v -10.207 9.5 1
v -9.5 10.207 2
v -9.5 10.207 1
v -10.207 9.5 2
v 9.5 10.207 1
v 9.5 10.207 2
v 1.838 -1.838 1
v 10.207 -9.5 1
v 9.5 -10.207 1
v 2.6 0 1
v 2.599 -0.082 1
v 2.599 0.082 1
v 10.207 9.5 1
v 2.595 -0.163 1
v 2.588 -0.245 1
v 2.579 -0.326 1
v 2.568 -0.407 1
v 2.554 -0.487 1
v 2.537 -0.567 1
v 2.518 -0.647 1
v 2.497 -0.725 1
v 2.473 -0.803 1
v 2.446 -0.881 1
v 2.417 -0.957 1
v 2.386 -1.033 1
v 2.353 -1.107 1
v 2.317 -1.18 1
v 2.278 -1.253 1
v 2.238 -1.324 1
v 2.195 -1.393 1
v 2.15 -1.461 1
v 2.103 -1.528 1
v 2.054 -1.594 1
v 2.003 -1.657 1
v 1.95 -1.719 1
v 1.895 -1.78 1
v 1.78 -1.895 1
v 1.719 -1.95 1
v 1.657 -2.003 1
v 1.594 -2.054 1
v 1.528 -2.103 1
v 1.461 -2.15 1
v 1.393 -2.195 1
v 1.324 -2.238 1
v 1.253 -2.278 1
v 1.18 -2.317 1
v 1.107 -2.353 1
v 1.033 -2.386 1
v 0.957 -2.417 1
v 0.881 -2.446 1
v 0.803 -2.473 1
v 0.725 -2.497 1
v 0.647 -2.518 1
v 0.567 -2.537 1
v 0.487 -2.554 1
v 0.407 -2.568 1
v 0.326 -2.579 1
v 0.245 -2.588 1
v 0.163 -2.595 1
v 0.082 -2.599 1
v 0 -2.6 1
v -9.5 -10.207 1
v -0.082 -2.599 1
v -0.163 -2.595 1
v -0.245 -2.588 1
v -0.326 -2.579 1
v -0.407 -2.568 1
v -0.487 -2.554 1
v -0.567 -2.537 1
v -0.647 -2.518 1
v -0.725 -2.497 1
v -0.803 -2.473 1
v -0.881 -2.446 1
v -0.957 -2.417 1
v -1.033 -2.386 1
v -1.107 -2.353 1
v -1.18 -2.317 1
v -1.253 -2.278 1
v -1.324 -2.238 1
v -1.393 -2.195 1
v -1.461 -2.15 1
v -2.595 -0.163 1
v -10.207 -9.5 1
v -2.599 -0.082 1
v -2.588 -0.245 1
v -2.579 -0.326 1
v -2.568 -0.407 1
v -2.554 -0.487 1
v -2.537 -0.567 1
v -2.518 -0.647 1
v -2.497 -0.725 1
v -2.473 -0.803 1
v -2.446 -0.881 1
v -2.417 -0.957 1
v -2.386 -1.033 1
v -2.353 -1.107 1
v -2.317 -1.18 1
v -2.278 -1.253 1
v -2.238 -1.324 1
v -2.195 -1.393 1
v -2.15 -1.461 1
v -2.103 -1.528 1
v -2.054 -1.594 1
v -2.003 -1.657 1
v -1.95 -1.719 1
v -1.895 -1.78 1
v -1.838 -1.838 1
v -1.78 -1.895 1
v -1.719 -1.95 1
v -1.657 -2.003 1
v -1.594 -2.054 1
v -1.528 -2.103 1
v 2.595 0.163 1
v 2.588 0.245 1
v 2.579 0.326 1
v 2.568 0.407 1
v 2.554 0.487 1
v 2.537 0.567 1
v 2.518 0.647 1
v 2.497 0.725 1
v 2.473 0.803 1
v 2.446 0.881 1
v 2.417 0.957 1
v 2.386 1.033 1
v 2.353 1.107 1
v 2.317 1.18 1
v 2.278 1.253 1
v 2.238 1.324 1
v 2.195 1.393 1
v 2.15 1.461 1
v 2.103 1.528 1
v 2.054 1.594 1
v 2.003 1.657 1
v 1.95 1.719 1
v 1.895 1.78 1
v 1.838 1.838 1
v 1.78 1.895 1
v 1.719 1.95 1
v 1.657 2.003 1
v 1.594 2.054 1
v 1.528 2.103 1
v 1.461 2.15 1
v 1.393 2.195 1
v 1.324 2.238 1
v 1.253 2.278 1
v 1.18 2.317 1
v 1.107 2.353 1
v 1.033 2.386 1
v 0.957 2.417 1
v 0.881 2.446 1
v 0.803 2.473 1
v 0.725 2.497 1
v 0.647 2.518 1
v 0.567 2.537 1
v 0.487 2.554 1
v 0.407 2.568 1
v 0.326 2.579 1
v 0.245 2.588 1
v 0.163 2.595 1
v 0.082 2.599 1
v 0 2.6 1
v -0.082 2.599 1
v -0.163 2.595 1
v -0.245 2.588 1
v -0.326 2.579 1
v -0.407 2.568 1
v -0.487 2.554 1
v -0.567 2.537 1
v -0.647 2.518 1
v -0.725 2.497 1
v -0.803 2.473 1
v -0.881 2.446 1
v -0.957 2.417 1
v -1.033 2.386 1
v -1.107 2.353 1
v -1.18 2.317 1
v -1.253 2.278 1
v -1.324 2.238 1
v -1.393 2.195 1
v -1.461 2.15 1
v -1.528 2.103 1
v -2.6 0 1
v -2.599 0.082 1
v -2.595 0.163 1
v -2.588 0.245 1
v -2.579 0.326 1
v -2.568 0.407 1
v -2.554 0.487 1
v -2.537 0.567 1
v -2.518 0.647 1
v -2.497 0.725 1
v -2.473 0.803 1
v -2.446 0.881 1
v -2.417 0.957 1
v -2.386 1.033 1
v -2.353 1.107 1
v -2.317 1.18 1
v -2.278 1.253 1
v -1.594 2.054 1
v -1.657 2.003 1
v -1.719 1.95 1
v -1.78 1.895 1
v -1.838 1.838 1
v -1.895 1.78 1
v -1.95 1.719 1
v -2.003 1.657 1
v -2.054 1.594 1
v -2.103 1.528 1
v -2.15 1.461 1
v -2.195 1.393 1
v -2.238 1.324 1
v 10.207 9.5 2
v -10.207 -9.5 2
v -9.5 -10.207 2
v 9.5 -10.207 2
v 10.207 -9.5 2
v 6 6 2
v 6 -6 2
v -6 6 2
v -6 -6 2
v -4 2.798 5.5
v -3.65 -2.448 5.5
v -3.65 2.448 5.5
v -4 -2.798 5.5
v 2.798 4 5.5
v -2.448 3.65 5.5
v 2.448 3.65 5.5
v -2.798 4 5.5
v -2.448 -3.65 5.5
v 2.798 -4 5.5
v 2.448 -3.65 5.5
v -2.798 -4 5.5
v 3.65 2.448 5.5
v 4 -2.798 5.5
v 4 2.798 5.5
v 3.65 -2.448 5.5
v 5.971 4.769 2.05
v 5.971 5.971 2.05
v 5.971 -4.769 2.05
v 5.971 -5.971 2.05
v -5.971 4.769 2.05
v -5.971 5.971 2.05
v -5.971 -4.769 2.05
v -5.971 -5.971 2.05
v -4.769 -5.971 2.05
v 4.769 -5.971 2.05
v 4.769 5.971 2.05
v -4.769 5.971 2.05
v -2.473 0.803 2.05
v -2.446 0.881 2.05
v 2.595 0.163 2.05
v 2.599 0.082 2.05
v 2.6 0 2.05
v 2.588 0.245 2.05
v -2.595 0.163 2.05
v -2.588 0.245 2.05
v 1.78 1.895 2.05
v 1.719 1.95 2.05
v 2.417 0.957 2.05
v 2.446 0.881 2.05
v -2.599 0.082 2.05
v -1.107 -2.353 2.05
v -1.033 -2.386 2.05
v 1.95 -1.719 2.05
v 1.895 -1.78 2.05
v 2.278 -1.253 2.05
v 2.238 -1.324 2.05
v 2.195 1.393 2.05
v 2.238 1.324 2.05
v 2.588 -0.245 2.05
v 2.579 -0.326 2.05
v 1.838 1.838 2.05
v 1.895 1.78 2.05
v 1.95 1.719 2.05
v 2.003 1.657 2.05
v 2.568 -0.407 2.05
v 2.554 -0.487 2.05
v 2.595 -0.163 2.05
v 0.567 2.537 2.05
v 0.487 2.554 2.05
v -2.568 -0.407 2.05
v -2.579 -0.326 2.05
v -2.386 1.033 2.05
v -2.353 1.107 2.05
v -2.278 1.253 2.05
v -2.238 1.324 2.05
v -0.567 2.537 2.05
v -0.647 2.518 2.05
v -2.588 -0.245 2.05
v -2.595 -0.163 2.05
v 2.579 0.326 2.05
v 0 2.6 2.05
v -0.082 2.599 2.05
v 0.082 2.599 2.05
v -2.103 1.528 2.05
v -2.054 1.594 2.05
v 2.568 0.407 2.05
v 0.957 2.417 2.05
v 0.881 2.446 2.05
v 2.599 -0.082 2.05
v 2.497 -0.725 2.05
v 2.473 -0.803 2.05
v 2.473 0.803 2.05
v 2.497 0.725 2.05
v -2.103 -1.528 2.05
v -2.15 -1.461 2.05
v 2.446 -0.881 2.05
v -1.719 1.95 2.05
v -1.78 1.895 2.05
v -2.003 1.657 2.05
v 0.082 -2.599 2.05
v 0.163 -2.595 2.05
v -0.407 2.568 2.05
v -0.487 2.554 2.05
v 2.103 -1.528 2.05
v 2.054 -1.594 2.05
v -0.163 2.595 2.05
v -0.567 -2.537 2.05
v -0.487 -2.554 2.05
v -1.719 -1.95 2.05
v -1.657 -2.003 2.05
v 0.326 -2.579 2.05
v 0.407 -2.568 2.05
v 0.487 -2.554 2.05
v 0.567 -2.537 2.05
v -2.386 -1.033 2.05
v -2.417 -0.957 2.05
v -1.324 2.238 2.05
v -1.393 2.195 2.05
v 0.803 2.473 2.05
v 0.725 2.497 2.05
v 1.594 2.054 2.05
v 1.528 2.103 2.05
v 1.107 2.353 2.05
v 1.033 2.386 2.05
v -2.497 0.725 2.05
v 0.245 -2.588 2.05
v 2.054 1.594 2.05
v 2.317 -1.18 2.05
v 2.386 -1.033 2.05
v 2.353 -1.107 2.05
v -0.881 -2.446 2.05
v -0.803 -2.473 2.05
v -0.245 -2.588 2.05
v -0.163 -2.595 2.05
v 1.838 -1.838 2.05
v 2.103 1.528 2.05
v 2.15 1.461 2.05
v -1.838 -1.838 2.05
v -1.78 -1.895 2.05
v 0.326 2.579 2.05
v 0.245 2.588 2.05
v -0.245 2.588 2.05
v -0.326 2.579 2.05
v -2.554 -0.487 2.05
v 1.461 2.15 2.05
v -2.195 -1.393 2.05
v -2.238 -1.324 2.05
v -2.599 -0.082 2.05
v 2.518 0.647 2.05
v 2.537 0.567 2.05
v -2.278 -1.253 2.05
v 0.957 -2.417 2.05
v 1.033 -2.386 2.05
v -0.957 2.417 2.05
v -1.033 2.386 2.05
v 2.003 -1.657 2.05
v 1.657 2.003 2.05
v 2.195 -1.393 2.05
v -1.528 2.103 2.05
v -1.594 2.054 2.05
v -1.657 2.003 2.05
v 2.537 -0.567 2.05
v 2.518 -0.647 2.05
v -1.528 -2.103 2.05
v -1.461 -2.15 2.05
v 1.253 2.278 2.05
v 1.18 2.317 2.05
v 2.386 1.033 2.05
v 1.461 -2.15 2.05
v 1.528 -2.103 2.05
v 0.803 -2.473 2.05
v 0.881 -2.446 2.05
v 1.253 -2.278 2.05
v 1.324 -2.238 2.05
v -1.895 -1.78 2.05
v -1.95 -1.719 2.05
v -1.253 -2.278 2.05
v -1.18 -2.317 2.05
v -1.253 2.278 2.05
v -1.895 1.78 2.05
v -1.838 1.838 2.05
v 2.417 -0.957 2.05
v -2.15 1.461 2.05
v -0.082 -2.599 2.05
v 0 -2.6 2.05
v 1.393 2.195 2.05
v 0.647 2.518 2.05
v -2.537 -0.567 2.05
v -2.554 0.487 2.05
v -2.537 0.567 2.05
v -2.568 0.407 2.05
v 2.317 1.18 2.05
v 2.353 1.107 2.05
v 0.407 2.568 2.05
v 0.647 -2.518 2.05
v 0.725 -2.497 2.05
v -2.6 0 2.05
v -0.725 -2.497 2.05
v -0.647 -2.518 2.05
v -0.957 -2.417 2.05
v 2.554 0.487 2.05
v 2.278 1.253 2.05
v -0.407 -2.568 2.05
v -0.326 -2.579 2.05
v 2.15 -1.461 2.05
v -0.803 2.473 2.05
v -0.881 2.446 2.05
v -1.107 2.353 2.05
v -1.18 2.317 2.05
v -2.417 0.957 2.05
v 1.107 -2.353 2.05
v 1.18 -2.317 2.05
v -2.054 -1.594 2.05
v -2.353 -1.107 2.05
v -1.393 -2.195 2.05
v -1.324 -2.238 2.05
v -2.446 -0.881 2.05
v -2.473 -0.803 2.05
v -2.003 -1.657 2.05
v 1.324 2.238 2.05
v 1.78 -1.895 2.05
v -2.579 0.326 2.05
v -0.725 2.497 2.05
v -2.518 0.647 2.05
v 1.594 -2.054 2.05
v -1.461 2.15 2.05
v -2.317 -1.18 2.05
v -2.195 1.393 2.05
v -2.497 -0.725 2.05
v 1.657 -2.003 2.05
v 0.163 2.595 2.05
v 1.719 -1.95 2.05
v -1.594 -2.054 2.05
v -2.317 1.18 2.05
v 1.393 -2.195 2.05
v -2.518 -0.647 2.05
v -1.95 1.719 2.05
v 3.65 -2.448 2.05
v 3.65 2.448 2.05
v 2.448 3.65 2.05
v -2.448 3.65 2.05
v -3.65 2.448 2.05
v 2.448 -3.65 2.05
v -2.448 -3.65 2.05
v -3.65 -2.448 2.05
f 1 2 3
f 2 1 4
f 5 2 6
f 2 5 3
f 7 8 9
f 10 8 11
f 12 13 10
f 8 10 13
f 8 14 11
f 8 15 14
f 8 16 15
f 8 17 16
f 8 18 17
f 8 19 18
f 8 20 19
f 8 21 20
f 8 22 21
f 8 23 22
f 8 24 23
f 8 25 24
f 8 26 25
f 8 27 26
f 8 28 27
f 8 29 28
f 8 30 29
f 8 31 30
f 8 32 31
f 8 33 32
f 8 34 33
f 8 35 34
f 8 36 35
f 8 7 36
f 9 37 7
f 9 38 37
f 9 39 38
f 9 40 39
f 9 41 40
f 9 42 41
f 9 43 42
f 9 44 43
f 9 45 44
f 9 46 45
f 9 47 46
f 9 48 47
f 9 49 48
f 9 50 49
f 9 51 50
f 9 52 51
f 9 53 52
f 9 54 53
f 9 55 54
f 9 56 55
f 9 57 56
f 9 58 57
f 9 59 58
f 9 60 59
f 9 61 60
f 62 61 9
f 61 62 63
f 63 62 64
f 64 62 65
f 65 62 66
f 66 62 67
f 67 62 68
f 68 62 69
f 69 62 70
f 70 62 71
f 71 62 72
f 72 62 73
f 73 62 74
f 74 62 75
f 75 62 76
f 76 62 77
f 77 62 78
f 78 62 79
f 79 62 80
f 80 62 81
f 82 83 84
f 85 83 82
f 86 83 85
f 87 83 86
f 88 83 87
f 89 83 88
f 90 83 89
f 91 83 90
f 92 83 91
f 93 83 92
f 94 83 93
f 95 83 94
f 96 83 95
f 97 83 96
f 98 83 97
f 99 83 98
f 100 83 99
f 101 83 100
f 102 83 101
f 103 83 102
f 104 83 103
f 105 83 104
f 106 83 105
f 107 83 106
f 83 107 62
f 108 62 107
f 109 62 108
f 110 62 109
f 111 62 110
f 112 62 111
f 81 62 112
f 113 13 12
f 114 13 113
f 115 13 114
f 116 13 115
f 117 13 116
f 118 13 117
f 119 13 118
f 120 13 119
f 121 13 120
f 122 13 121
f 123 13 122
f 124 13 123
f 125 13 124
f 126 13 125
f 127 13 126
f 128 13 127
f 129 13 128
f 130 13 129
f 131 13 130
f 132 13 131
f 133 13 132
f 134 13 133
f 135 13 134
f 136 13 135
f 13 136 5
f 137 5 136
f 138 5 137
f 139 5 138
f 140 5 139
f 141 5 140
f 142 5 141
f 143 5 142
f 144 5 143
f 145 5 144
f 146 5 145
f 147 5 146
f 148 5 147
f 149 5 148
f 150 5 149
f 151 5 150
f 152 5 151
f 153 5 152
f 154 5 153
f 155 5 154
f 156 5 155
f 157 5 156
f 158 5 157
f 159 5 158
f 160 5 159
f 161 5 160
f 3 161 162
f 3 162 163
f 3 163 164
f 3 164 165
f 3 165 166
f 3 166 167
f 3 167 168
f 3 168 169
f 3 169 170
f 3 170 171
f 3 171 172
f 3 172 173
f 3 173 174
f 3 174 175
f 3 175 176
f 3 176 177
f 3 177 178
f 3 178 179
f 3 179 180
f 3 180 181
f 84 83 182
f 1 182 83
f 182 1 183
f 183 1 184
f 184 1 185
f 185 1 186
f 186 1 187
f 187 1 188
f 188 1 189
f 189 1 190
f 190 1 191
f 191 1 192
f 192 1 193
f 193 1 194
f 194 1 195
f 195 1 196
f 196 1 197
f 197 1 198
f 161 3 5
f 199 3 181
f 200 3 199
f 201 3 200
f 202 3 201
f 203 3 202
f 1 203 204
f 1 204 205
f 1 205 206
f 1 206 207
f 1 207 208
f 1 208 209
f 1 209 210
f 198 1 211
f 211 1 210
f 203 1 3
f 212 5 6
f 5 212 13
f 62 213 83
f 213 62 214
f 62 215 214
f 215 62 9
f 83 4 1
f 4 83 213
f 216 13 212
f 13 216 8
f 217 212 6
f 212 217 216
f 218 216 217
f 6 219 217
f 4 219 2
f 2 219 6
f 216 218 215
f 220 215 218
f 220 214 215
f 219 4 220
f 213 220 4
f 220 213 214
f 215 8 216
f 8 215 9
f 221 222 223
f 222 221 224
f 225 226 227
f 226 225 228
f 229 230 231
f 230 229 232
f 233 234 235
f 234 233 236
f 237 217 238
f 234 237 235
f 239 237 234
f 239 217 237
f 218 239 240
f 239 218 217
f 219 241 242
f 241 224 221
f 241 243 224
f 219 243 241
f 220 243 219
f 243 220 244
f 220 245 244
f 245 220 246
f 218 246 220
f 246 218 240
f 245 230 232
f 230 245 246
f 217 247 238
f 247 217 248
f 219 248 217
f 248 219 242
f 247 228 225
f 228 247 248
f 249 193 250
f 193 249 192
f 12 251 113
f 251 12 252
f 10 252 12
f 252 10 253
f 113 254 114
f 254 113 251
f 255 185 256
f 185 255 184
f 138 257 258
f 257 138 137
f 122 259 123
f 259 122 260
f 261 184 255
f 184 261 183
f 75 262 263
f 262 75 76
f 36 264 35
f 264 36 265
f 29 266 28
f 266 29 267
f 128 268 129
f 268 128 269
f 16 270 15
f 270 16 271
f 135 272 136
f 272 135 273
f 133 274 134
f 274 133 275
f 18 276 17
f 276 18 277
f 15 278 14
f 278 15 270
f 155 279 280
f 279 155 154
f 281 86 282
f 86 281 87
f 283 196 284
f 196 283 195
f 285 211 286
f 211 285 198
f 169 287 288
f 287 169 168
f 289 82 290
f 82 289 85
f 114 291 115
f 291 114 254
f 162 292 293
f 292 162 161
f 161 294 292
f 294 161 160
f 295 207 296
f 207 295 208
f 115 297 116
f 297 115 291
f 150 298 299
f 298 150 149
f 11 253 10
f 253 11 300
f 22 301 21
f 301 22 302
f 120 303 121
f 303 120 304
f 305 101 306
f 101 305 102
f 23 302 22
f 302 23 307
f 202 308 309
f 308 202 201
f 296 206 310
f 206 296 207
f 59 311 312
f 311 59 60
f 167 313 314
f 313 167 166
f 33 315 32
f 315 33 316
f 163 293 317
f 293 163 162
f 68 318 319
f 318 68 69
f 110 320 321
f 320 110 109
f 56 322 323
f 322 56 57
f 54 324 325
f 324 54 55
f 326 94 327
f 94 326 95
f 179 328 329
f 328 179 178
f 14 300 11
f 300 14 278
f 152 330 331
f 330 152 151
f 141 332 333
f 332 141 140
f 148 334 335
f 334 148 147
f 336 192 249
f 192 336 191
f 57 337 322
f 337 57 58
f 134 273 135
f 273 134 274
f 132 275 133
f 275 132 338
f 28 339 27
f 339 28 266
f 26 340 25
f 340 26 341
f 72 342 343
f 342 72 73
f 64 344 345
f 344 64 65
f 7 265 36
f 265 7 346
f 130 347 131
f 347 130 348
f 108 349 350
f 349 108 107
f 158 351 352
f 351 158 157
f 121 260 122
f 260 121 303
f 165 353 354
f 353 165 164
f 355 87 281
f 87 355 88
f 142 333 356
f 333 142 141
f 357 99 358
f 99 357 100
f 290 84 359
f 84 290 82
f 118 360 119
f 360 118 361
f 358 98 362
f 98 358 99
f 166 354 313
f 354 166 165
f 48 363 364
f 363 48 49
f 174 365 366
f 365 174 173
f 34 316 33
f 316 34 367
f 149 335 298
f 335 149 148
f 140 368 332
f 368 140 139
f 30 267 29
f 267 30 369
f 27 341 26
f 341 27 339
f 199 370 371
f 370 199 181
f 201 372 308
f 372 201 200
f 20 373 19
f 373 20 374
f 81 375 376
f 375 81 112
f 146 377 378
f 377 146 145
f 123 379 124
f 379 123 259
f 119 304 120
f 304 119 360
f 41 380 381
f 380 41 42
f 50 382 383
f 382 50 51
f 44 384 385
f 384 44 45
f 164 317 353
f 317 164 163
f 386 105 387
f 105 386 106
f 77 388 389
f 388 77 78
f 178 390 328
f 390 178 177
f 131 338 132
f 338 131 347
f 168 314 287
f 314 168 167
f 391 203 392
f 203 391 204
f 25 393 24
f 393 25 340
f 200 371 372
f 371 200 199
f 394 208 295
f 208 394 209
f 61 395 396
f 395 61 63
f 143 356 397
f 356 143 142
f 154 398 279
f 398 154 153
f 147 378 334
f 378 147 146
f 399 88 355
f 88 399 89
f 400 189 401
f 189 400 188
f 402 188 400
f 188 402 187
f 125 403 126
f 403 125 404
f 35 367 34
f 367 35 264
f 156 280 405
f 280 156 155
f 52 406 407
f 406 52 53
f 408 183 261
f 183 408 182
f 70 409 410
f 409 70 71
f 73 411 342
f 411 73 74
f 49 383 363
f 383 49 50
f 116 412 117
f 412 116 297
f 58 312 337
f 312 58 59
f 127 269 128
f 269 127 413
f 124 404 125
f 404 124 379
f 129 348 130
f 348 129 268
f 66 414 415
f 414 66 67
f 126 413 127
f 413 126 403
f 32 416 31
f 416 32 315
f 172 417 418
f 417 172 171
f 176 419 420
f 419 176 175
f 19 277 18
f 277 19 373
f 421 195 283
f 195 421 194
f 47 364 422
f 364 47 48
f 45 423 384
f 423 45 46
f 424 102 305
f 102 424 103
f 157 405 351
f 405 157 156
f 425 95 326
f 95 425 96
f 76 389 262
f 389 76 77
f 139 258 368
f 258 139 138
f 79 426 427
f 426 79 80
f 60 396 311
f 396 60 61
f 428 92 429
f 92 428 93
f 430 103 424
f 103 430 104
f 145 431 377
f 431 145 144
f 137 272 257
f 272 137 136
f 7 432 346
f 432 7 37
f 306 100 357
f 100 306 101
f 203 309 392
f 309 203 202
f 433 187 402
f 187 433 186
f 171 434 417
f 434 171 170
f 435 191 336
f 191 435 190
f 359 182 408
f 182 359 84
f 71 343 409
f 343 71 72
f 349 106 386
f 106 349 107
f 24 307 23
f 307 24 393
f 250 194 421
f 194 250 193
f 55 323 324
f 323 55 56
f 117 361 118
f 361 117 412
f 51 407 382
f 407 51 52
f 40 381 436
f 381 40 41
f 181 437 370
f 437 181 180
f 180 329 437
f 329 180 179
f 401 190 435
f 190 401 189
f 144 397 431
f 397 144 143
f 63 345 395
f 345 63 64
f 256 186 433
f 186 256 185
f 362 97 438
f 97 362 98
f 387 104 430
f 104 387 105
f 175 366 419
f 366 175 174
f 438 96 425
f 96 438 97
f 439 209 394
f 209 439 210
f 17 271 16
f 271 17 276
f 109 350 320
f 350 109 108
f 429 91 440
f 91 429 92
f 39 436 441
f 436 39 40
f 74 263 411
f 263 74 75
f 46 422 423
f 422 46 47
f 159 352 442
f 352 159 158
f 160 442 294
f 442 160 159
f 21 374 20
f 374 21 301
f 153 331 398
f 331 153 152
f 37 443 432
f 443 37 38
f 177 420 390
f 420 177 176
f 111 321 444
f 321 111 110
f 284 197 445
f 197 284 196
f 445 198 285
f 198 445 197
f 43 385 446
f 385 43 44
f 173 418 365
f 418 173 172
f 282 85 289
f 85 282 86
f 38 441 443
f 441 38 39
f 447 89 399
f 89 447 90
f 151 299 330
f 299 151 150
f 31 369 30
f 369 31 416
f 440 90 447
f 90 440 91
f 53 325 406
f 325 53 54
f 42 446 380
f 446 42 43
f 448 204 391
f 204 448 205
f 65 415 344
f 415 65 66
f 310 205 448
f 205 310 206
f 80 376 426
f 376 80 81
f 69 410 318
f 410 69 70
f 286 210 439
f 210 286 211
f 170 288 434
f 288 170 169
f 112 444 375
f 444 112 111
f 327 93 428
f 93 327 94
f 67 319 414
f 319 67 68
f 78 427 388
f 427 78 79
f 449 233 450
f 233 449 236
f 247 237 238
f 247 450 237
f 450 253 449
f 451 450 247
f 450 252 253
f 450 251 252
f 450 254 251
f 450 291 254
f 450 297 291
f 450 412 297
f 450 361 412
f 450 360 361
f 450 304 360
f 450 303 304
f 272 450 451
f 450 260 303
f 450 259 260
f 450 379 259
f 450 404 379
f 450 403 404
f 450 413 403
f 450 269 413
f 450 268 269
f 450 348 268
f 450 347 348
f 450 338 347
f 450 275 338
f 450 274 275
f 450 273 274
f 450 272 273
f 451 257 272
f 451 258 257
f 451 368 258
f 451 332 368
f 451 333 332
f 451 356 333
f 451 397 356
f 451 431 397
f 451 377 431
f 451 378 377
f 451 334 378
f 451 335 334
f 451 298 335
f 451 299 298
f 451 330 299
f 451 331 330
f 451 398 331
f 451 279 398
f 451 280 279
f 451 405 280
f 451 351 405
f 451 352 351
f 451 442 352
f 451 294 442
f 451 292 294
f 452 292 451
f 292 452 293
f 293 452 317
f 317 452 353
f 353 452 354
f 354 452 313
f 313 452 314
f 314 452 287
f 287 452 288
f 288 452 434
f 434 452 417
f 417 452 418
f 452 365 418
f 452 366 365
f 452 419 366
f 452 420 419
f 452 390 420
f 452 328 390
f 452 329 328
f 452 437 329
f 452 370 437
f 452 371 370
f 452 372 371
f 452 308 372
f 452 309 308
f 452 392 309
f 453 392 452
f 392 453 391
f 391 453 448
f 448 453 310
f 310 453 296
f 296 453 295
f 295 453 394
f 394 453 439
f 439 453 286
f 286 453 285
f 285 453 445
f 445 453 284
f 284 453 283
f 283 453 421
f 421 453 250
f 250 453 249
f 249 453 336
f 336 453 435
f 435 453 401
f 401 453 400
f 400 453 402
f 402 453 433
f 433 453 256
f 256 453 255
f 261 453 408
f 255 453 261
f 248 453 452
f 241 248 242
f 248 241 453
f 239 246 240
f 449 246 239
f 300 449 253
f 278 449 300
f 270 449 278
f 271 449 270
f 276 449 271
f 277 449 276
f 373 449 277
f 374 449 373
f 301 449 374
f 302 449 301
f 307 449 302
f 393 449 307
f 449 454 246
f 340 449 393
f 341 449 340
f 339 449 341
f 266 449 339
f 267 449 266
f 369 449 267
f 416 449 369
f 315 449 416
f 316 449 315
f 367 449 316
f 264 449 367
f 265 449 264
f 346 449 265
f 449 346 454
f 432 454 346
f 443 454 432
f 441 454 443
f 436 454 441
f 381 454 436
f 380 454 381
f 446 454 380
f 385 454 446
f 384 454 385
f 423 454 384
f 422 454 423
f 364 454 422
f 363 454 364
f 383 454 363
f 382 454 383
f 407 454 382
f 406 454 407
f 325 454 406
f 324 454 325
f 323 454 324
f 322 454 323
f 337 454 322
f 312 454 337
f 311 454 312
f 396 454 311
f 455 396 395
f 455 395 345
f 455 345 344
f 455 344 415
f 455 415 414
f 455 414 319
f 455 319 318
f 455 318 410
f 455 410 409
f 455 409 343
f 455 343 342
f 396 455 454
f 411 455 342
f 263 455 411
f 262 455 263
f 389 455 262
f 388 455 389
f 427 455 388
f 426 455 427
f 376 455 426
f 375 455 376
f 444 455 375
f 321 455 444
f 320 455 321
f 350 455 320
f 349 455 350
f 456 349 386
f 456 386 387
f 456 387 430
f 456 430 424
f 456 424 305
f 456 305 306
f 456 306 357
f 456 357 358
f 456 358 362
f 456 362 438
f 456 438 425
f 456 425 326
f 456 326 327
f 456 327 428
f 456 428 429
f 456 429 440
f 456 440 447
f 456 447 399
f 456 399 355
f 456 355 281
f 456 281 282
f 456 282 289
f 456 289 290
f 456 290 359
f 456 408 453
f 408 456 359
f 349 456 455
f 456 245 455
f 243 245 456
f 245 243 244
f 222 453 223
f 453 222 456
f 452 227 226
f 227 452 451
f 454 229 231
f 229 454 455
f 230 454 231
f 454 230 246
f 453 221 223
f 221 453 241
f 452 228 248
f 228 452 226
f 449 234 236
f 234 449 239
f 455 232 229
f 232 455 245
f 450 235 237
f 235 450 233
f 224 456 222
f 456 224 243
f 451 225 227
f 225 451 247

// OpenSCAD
$fn = 200;

cap();

module cap(){
    difference(){
        union(){
            translate([0,0,1.5])minkowski(){
                cube([19,19,0.5],center=true);
                rotate([0,0,45])cube([1,1,0.5],center=true);
            }
            hull(){
                translate([0,0,6/2+0.5])cube([8,8,4],center=true);
                translate([0,0,2/2+0.5])cube([12,12,1],center=true);
            }
        }union(){
            translate([0,0,-0.5])cylinder(d=5.2,h=3);
            translate([0,0,4/2+2.1])cube([7.3,7.3,4.1],center=true);
            
            translate([0,0,4/2+2.1])rotate([0,0,45])cube([1.7,20,4.1],center=true);
            translate([0,0,4/2+2.1])rotate([0,0,-45])cube([1.7,20,4.1],center=true);
        }
    }
}
